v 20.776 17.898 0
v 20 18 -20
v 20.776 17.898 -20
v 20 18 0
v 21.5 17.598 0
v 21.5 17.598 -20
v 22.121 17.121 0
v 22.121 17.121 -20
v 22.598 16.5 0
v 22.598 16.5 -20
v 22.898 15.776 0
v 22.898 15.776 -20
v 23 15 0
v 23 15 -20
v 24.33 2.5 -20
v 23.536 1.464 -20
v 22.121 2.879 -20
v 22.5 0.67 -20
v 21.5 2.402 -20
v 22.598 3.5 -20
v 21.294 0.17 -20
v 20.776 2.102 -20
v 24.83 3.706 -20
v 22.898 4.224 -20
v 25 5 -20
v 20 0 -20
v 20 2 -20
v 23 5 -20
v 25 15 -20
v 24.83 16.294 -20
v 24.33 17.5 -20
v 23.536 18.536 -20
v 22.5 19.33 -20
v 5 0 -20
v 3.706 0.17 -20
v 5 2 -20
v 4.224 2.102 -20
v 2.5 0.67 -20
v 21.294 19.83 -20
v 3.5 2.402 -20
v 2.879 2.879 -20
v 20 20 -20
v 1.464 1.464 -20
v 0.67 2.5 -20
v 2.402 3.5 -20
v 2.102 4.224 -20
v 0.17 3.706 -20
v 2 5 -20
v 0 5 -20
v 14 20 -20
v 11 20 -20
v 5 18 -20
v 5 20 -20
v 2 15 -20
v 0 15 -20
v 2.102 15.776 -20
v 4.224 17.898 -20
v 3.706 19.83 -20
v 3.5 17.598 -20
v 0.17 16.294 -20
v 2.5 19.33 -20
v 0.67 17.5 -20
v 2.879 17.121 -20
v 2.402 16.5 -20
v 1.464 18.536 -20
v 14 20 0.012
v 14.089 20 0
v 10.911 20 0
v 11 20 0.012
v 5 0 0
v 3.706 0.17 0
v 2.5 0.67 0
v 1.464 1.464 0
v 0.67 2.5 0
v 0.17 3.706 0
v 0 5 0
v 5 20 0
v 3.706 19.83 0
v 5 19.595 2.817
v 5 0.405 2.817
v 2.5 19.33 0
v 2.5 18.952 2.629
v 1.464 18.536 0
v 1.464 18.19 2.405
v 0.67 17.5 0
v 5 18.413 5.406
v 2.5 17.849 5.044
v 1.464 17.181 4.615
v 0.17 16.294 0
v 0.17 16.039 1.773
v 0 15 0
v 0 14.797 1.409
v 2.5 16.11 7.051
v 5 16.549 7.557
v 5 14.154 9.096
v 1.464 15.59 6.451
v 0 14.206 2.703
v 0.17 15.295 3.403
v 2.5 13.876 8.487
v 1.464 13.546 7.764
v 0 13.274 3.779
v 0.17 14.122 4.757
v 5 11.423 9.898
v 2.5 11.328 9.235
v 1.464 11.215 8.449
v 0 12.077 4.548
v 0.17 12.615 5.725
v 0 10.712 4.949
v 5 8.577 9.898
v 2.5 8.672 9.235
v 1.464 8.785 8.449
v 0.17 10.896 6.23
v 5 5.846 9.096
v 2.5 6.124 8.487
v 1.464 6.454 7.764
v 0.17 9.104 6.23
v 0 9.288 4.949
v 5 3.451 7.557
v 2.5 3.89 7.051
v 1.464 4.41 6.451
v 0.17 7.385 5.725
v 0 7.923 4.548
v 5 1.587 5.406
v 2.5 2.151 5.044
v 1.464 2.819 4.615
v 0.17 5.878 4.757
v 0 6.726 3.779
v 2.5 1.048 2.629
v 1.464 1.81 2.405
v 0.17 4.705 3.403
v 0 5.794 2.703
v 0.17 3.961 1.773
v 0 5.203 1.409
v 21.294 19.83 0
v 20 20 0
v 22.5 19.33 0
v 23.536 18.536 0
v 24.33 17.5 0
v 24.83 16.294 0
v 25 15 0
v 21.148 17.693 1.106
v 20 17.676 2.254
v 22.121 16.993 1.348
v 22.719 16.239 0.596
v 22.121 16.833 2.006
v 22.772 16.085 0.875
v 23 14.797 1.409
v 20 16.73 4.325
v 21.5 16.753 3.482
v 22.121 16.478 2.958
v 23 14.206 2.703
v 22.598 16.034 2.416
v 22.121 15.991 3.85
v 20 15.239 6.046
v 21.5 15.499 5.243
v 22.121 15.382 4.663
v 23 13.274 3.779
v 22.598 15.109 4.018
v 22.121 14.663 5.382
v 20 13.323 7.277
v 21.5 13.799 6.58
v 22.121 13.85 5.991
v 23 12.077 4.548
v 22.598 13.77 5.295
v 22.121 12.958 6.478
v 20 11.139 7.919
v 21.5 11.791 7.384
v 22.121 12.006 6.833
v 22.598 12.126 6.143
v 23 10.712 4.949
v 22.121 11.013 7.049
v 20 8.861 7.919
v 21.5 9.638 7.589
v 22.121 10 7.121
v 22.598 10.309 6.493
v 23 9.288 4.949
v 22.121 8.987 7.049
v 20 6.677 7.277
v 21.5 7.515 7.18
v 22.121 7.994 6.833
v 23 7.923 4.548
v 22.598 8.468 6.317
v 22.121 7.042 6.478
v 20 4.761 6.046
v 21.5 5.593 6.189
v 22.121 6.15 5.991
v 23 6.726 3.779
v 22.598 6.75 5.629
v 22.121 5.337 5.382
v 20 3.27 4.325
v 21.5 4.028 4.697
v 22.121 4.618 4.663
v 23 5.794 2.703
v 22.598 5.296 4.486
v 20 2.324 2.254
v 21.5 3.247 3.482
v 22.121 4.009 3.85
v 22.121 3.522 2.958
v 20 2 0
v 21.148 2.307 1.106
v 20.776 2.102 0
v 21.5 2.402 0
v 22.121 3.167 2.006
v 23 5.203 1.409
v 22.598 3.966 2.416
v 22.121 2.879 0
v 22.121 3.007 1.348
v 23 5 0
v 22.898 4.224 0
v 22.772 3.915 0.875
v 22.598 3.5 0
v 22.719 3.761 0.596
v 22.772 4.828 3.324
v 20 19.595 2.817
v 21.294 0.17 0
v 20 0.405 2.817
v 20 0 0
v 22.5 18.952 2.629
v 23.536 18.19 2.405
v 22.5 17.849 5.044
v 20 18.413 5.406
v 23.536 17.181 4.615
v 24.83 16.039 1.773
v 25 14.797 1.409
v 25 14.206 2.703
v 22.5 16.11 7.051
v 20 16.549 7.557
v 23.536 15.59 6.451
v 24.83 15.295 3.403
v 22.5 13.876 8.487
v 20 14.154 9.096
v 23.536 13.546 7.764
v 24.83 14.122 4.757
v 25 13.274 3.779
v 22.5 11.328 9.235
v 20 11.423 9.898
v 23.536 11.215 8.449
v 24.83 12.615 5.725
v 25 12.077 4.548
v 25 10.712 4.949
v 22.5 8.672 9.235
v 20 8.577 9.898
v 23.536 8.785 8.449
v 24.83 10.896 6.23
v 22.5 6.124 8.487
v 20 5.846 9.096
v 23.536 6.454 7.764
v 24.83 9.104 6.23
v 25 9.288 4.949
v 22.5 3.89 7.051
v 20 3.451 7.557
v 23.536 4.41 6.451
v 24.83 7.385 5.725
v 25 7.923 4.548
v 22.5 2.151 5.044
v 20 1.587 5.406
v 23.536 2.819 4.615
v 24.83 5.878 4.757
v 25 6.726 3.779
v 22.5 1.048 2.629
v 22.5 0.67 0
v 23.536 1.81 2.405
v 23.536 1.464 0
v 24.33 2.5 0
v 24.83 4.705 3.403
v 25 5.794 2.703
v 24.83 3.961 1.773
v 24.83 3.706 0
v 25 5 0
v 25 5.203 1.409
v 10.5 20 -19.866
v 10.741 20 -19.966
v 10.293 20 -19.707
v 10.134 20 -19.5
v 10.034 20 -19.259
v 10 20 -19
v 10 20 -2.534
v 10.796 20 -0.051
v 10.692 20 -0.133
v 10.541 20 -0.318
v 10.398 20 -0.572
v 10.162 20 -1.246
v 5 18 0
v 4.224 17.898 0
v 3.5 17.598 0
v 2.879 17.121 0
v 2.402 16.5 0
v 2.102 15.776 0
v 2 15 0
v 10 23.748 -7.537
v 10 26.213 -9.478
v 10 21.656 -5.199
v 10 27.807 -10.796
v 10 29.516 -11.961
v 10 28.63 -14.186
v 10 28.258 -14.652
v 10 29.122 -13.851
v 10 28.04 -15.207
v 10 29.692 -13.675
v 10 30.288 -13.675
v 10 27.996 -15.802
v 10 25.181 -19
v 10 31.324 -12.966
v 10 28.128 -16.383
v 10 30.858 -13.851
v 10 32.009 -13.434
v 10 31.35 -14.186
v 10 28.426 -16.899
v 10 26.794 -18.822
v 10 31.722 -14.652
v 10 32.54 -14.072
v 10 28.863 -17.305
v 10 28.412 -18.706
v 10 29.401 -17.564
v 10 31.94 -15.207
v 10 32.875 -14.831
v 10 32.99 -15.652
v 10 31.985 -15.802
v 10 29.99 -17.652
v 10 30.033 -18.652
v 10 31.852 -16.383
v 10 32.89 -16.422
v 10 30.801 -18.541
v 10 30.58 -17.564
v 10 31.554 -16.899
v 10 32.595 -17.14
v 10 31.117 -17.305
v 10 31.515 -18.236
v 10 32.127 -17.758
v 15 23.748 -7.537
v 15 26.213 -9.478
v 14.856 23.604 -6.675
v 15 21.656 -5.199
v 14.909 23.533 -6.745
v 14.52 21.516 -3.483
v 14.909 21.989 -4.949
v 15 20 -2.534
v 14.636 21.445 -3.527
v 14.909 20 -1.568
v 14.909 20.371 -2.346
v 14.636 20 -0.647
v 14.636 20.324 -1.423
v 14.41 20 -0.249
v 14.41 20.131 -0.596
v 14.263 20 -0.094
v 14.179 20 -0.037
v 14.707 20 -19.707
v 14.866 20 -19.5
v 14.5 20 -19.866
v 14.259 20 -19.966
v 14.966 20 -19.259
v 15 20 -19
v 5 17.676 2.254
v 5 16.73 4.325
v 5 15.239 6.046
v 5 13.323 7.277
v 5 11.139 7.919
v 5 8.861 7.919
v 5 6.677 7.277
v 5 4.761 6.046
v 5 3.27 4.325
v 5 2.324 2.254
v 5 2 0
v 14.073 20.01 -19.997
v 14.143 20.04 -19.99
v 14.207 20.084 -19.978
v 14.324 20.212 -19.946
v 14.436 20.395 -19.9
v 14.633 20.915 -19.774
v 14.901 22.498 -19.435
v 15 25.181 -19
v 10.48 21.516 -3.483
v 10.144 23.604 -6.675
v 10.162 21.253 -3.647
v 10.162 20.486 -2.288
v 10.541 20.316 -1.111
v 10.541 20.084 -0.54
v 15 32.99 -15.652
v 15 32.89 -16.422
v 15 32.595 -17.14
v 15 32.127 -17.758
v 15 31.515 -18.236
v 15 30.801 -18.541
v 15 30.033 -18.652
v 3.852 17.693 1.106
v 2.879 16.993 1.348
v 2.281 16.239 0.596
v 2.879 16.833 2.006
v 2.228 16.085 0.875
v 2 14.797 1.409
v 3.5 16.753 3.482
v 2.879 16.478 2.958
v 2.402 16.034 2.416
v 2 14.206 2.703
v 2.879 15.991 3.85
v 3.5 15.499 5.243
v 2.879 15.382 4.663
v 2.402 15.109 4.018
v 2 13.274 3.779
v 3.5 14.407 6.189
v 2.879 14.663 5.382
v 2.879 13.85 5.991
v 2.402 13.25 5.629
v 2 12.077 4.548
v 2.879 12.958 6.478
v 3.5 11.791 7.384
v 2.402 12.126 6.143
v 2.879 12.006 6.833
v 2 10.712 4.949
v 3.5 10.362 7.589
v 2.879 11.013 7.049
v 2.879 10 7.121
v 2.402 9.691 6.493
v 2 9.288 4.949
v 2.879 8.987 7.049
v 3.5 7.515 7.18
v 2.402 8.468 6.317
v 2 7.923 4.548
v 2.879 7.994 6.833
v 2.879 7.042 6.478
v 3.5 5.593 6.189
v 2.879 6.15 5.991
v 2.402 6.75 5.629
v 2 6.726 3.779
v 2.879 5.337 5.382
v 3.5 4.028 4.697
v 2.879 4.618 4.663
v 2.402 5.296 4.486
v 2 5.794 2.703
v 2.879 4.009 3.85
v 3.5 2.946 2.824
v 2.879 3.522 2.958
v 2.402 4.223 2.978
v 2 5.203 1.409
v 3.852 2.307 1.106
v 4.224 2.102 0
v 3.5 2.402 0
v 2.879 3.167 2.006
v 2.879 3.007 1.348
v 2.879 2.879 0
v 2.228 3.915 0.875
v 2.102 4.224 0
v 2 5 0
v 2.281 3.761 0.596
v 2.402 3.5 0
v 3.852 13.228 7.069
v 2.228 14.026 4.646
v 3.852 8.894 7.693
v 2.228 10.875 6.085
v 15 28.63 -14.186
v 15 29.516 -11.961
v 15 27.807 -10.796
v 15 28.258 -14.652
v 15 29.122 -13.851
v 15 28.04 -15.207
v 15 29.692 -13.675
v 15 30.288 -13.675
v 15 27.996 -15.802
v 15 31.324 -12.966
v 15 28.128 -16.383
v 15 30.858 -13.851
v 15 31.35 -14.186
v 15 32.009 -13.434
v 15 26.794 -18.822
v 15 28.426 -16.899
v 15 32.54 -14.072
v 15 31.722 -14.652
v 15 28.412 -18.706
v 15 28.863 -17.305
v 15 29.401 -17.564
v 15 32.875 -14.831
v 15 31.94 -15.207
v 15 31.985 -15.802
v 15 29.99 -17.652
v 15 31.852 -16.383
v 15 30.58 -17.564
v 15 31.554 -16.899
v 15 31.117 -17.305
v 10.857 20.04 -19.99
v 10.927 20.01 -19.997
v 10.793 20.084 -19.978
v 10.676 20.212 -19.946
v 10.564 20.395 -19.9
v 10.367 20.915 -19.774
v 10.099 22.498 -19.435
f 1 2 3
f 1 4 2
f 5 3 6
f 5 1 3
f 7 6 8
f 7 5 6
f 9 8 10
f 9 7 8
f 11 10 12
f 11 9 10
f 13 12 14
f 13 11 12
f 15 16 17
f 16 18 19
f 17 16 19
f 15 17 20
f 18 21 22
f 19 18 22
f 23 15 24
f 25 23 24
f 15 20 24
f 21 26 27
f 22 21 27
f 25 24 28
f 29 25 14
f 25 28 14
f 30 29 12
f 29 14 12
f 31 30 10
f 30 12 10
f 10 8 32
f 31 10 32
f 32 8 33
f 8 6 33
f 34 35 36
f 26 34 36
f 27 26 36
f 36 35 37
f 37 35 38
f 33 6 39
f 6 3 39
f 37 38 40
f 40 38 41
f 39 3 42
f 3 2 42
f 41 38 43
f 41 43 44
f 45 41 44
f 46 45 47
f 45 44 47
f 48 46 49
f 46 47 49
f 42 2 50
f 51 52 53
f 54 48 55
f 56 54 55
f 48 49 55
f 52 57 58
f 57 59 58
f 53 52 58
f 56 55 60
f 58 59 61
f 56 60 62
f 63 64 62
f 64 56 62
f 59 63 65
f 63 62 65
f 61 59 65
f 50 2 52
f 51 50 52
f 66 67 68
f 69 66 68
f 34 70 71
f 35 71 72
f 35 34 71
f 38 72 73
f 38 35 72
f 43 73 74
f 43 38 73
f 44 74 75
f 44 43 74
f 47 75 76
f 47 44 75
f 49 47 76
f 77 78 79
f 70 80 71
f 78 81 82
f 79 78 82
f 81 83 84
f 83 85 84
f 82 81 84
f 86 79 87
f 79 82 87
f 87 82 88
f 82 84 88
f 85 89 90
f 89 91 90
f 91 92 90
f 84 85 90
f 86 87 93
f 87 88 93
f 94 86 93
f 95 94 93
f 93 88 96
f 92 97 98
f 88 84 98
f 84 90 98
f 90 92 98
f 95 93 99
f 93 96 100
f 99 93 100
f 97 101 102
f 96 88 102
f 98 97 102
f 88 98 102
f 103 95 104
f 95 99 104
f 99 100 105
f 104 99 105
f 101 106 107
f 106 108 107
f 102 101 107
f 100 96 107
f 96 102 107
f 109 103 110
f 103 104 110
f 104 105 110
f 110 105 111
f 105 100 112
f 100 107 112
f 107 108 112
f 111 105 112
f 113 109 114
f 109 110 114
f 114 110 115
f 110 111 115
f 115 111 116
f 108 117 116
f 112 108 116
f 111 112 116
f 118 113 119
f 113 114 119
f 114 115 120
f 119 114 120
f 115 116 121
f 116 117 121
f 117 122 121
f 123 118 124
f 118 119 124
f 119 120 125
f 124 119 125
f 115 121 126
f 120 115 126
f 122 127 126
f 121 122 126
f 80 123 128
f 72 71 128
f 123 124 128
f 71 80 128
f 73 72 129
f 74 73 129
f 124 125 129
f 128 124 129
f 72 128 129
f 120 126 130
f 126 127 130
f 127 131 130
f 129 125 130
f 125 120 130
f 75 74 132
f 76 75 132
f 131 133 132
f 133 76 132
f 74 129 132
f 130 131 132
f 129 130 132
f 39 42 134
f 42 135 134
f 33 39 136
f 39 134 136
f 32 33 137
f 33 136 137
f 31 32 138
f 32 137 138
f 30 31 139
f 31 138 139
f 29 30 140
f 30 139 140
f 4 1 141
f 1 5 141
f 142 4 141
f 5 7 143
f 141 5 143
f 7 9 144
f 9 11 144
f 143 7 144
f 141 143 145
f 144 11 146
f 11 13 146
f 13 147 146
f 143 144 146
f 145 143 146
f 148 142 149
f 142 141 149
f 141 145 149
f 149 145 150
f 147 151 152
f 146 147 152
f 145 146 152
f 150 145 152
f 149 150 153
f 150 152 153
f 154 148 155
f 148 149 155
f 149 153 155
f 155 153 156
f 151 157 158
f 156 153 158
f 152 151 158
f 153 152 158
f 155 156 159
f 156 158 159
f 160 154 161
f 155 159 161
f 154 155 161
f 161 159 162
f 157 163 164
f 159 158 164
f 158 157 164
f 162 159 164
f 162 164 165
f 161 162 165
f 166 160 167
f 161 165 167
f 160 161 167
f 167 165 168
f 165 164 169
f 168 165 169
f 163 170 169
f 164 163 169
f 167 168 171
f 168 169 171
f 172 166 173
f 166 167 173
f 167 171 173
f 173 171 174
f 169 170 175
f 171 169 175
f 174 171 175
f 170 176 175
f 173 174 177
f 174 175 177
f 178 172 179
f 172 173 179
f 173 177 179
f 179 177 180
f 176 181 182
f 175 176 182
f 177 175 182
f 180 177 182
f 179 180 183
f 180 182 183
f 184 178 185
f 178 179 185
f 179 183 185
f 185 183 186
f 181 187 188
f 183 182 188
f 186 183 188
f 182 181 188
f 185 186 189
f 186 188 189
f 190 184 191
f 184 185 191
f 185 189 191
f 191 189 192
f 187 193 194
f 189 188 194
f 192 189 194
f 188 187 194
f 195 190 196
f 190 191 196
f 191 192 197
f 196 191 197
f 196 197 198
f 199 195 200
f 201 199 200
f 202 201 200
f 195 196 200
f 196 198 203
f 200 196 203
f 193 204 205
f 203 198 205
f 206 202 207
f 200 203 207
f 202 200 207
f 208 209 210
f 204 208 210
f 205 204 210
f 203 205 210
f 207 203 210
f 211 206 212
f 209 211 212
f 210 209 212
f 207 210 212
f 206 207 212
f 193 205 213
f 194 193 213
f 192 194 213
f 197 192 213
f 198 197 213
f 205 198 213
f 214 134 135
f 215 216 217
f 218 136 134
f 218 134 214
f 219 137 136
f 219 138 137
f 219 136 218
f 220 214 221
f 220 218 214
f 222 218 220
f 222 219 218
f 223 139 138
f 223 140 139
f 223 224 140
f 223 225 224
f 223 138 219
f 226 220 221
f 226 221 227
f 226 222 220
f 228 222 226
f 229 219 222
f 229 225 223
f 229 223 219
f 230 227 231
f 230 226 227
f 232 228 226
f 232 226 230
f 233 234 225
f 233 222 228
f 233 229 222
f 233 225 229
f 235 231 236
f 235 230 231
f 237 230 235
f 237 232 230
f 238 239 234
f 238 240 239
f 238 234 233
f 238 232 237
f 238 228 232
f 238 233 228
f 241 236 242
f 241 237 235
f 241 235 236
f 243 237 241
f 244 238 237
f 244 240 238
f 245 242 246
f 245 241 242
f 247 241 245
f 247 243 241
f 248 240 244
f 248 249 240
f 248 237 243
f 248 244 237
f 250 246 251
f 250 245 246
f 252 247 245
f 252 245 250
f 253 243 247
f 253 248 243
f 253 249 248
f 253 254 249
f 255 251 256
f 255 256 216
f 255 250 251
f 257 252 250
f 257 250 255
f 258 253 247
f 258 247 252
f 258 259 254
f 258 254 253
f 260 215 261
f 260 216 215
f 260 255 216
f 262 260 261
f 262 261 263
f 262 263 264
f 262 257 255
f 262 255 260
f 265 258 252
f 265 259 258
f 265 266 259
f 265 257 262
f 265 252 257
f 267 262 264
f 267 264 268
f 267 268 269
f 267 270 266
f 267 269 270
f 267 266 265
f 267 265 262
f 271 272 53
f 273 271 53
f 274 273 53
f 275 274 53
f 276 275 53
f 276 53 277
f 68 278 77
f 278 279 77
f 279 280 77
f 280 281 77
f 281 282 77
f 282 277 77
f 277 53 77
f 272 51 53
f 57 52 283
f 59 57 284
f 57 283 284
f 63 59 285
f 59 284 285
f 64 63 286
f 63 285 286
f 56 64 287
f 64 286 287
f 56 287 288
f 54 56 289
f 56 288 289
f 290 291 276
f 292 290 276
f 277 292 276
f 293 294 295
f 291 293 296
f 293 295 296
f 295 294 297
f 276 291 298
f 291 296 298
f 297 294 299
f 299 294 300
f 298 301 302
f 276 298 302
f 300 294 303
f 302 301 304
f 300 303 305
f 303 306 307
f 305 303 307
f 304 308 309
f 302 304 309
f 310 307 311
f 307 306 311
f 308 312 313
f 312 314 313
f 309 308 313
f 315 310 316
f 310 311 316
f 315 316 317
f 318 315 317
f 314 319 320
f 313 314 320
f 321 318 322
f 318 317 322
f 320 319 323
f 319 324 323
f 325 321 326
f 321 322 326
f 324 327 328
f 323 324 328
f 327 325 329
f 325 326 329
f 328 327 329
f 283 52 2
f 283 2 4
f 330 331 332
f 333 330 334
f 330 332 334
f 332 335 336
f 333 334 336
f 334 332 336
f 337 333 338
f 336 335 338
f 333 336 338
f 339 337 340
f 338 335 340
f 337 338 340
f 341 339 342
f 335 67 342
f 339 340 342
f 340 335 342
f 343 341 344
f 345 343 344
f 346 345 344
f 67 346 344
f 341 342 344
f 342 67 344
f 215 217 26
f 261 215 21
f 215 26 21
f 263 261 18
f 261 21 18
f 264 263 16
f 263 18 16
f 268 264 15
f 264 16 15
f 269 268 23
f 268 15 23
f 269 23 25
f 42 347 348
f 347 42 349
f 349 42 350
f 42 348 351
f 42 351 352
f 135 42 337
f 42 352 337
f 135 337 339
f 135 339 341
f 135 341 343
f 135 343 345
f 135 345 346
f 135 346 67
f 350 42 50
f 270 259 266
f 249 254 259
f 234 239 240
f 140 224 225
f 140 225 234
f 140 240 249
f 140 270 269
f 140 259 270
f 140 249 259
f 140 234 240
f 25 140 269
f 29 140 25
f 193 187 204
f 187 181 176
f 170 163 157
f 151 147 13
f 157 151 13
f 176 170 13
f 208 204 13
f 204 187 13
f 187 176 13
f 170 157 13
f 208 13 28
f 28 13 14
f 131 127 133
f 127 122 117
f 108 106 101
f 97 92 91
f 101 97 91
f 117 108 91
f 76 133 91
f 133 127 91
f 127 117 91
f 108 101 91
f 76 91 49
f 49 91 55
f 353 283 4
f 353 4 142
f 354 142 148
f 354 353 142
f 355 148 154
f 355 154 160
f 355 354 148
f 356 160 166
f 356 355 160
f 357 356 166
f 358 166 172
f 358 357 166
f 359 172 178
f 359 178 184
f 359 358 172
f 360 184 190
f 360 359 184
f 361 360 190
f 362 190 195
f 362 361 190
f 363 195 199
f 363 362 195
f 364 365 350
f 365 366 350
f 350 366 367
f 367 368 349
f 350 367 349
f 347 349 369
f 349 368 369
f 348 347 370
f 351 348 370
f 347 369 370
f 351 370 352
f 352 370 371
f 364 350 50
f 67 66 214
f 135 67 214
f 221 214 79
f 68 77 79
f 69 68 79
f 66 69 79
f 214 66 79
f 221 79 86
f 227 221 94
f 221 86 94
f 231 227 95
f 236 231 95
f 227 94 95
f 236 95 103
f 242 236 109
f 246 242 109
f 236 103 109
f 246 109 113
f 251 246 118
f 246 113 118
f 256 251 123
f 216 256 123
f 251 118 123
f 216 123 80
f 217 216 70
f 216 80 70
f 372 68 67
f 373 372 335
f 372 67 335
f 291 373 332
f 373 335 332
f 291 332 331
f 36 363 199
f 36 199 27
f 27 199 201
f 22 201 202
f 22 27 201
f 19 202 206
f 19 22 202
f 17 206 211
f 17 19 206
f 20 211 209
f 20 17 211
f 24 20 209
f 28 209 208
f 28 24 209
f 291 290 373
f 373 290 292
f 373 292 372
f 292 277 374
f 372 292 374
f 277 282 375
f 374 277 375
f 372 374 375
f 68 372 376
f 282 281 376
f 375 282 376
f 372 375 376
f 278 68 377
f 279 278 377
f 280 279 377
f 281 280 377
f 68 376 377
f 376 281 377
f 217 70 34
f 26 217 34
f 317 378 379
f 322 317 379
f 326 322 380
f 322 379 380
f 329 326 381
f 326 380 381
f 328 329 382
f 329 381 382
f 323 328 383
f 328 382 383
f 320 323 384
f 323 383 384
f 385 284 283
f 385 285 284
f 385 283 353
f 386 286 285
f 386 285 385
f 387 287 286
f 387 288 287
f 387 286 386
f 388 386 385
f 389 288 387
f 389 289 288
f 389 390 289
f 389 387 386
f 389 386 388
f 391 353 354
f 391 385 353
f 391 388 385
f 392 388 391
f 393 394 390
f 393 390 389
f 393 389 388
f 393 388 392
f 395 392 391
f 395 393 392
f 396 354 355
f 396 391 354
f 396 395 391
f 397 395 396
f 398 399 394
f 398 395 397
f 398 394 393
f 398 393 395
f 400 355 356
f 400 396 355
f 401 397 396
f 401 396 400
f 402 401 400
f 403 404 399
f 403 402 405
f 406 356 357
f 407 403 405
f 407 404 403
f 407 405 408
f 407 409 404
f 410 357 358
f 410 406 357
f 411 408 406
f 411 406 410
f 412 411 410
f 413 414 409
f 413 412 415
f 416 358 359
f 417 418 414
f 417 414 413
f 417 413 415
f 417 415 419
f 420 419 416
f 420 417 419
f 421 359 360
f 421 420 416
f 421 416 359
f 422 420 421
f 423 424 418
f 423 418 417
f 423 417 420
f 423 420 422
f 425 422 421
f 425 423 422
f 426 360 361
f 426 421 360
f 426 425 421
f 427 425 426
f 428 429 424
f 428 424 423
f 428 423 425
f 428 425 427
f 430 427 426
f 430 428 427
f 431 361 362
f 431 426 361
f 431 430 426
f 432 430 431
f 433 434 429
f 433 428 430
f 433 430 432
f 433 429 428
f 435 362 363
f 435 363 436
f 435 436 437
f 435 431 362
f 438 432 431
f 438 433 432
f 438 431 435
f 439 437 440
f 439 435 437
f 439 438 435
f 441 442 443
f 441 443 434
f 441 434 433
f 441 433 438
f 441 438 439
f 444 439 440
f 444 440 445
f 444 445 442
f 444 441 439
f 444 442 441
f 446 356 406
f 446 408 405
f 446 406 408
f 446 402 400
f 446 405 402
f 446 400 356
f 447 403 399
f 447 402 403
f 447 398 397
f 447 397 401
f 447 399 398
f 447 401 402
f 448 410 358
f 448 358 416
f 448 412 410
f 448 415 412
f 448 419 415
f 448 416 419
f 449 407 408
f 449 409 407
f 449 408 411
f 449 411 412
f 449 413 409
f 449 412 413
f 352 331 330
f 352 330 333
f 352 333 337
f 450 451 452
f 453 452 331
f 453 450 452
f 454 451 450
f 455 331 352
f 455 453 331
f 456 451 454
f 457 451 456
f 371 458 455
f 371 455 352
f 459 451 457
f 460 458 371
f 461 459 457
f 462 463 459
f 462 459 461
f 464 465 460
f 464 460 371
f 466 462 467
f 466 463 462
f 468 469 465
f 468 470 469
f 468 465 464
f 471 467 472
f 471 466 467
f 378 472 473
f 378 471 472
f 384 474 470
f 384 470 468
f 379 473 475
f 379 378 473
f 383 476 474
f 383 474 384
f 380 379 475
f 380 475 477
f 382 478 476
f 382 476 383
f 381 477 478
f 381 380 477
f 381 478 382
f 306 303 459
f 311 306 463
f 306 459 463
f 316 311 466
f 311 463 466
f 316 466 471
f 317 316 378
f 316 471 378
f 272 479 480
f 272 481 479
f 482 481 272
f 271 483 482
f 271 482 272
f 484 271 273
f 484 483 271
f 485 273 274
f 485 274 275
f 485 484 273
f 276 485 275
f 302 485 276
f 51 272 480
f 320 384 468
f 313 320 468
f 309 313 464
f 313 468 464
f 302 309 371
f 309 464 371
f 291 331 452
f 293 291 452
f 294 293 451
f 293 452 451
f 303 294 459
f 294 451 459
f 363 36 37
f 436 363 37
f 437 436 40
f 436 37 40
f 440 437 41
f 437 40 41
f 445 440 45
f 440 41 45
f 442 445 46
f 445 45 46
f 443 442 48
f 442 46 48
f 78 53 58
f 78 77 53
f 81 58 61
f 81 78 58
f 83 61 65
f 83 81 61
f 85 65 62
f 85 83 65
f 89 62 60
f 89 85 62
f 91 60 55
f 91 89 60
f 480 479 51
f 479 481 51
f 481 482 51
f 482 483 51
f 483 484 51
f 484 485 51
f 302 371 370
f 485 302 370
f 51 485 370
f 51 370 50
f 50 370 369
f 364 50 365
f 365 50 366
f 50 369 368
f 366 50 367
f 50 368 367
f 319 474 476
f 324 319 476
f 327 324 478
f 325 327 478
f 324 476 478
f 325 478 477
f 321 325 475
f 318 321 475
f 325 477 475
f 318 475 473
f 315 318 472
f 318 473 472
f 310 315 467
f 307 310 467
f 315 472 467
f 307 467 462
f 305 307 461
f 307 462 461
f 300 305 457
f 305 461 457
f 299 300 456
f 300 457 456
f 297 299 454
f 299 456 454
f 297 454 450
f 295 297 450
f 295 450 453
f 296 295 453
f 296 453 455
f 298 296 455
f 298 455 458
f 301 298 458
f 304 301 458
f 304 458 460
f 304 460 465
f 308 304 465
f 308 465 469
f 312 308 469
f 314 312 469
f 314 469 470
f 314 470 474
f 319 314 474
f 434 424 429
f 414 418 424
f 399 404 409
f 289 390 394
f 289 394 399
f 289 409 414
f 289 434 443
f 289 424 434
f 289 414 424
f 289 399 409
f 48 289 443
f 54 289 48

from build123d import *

# Parameters (mm, degrees)
SALIENTE_EXTRUIR1_DEPTH = 25
REDONDEO1_R             = 5
VACIADO1_T              = -2
SALIENTE_EXTRUIR2_DEPTH = 2.5
REDONDEO3_R             = 1
CROQUIS4_R              = 2
CORTAR_EXTRUIR1_DEPTH   = 43.193943257
CORTAR_EXTRUIR2_DEPTH   = 10


with BuildPart() as part:
    # Croquis1 → Saliente-Extruir1 (new body)
    with BuildSketch(Plane(origin=(0, 0, 0), x_dir=(0, 0, -1), z_dir=(1, 0, 0))):
        with BuildLine():
            Line((0, 0), (20, 0))
            Line((20, 0), (20, 20))
            Line((20, 20), (0, 20))
            ThreePointArc((0, 20), (-10, 10), (0, 0))
        make_face()
    extrude(amount=SALIENTE_EXTRUIR1_DEPTH)

    # Redondeo1
    redondeo1_edges = [part.edges().sort_by_distance(p)[0] for p in [
        (0, 0, -10),
        (0, 10, 10),
        (25, 0, -10),
        (25, 10, 10),
        (0, 20, -10),
        (25, 20, -10),
    ]]
    fillet(redondeo1_edges, radius=REDONDEO1_R)

    # Vaciado1
    vaciado1_openings = [part.faces().sort_by_distance(p)[0] for p in [
        (12.5, 10, -20),
    ]]
    offset(amount=VACIADO1_T, openings=vaciado1_openings, kind=Kind.INTERSECTION)


with BuildPart() as saliente_extruir2_tool:
    # Croquis3 → Saliente-Extruir2 (new, symmetric)
    with BuildSketch(Plane(origin=(12.5, 0, 0), x_dir=(0, 0, -1), z_dir=(1, 0, 0))):
        with BuildLine():
            Line((20, 20), (20, 33.990128519))
            Line((20, 33.990128519), (11.304943529, 33.990128519))
            ThreePointArc((11.304943529, 33.990128519), (7.637753489, 25.384236828), (-0.012060129, 20))
            Line((-0.012060129, 20), (20, 20))
        make_face()
    extrude(amount=SALIENTE_EXTRUIR2_DEPTH, both=True)


with BuildPart() as part_1:
    add(part.part)


with BuildPart() as part_2:
    # Saliente-Extruir2: joined with saliente_extruir2_tool
    add(part_1.part.fuse(saliente_extruir2_tool.part, tol=0.00001))

    # Redondeo3
    redondeo3_edges = [part_2.edges().sort_by_distance(p)[0] for p in [
        (15, 33.990128519, -15.652471765),
        (15, 26.99506426, -20),
        (15, 25.384236828, -7.637753489),
        (10, 26.99506426, -20),
        (10, 25.384236828, -7.637753489),
        (10, 33.990128519, -15.652471765),
    ]]
    fillet(redondeo3_edges, radius=REDONDEO3_R)

    # Croquis4 → Cortar-Extruir1 (cut, through all)
    with BuildSketch(Plane(origin=(15, 0, 0), x_dir=(0, 0, -1), z_dir=(1, 0, 0))):
        with Locations((15.652471765, 29.990128519)):
            Circle(CROQUIS4_R)
    extrude(amount=-CORTAR_EXTRUIR1_DEPTH, mode=Mode.SUBTRACT)

    # Croquis5 → Cortar-Extruir2 (cut)
    with BuildSketch(Plane(origin=(15, 0, 0), x_dir=(0, 0, -1), z_dir=(1, 0, 0))):
        with BuildLine():
            Line((-7.217046024, 20), (0, 20))
            ThreePointArc((0, 20), (7.606790839, 24.37534101), (12.965556832, 31.324477852))
            ThreePointArc((12.965556832, 31.324477852), (16.316683617, 32.915675069), (18.652159682, 30.033399776))
            ThreePointArc((18.652159682, 30.033399776), (19.02695235, 24.97651649), (20, 20))
            Line((20, 20), (25.571513897, 20))
            Line((25.571513897, 20), (25.571513897, 39.781584786))
            Line((25.571513897, 39.781584786), (-7.217046024, 39.781584786))
            Line((-7.217046024, 39.781584786), (-7.217046024, 20))
        make_face()
    extrude(amount=-CORTAR_EXTRUIR2_DEPTH, mode=Mode.SUBTRACT)


solid = part_2.part
